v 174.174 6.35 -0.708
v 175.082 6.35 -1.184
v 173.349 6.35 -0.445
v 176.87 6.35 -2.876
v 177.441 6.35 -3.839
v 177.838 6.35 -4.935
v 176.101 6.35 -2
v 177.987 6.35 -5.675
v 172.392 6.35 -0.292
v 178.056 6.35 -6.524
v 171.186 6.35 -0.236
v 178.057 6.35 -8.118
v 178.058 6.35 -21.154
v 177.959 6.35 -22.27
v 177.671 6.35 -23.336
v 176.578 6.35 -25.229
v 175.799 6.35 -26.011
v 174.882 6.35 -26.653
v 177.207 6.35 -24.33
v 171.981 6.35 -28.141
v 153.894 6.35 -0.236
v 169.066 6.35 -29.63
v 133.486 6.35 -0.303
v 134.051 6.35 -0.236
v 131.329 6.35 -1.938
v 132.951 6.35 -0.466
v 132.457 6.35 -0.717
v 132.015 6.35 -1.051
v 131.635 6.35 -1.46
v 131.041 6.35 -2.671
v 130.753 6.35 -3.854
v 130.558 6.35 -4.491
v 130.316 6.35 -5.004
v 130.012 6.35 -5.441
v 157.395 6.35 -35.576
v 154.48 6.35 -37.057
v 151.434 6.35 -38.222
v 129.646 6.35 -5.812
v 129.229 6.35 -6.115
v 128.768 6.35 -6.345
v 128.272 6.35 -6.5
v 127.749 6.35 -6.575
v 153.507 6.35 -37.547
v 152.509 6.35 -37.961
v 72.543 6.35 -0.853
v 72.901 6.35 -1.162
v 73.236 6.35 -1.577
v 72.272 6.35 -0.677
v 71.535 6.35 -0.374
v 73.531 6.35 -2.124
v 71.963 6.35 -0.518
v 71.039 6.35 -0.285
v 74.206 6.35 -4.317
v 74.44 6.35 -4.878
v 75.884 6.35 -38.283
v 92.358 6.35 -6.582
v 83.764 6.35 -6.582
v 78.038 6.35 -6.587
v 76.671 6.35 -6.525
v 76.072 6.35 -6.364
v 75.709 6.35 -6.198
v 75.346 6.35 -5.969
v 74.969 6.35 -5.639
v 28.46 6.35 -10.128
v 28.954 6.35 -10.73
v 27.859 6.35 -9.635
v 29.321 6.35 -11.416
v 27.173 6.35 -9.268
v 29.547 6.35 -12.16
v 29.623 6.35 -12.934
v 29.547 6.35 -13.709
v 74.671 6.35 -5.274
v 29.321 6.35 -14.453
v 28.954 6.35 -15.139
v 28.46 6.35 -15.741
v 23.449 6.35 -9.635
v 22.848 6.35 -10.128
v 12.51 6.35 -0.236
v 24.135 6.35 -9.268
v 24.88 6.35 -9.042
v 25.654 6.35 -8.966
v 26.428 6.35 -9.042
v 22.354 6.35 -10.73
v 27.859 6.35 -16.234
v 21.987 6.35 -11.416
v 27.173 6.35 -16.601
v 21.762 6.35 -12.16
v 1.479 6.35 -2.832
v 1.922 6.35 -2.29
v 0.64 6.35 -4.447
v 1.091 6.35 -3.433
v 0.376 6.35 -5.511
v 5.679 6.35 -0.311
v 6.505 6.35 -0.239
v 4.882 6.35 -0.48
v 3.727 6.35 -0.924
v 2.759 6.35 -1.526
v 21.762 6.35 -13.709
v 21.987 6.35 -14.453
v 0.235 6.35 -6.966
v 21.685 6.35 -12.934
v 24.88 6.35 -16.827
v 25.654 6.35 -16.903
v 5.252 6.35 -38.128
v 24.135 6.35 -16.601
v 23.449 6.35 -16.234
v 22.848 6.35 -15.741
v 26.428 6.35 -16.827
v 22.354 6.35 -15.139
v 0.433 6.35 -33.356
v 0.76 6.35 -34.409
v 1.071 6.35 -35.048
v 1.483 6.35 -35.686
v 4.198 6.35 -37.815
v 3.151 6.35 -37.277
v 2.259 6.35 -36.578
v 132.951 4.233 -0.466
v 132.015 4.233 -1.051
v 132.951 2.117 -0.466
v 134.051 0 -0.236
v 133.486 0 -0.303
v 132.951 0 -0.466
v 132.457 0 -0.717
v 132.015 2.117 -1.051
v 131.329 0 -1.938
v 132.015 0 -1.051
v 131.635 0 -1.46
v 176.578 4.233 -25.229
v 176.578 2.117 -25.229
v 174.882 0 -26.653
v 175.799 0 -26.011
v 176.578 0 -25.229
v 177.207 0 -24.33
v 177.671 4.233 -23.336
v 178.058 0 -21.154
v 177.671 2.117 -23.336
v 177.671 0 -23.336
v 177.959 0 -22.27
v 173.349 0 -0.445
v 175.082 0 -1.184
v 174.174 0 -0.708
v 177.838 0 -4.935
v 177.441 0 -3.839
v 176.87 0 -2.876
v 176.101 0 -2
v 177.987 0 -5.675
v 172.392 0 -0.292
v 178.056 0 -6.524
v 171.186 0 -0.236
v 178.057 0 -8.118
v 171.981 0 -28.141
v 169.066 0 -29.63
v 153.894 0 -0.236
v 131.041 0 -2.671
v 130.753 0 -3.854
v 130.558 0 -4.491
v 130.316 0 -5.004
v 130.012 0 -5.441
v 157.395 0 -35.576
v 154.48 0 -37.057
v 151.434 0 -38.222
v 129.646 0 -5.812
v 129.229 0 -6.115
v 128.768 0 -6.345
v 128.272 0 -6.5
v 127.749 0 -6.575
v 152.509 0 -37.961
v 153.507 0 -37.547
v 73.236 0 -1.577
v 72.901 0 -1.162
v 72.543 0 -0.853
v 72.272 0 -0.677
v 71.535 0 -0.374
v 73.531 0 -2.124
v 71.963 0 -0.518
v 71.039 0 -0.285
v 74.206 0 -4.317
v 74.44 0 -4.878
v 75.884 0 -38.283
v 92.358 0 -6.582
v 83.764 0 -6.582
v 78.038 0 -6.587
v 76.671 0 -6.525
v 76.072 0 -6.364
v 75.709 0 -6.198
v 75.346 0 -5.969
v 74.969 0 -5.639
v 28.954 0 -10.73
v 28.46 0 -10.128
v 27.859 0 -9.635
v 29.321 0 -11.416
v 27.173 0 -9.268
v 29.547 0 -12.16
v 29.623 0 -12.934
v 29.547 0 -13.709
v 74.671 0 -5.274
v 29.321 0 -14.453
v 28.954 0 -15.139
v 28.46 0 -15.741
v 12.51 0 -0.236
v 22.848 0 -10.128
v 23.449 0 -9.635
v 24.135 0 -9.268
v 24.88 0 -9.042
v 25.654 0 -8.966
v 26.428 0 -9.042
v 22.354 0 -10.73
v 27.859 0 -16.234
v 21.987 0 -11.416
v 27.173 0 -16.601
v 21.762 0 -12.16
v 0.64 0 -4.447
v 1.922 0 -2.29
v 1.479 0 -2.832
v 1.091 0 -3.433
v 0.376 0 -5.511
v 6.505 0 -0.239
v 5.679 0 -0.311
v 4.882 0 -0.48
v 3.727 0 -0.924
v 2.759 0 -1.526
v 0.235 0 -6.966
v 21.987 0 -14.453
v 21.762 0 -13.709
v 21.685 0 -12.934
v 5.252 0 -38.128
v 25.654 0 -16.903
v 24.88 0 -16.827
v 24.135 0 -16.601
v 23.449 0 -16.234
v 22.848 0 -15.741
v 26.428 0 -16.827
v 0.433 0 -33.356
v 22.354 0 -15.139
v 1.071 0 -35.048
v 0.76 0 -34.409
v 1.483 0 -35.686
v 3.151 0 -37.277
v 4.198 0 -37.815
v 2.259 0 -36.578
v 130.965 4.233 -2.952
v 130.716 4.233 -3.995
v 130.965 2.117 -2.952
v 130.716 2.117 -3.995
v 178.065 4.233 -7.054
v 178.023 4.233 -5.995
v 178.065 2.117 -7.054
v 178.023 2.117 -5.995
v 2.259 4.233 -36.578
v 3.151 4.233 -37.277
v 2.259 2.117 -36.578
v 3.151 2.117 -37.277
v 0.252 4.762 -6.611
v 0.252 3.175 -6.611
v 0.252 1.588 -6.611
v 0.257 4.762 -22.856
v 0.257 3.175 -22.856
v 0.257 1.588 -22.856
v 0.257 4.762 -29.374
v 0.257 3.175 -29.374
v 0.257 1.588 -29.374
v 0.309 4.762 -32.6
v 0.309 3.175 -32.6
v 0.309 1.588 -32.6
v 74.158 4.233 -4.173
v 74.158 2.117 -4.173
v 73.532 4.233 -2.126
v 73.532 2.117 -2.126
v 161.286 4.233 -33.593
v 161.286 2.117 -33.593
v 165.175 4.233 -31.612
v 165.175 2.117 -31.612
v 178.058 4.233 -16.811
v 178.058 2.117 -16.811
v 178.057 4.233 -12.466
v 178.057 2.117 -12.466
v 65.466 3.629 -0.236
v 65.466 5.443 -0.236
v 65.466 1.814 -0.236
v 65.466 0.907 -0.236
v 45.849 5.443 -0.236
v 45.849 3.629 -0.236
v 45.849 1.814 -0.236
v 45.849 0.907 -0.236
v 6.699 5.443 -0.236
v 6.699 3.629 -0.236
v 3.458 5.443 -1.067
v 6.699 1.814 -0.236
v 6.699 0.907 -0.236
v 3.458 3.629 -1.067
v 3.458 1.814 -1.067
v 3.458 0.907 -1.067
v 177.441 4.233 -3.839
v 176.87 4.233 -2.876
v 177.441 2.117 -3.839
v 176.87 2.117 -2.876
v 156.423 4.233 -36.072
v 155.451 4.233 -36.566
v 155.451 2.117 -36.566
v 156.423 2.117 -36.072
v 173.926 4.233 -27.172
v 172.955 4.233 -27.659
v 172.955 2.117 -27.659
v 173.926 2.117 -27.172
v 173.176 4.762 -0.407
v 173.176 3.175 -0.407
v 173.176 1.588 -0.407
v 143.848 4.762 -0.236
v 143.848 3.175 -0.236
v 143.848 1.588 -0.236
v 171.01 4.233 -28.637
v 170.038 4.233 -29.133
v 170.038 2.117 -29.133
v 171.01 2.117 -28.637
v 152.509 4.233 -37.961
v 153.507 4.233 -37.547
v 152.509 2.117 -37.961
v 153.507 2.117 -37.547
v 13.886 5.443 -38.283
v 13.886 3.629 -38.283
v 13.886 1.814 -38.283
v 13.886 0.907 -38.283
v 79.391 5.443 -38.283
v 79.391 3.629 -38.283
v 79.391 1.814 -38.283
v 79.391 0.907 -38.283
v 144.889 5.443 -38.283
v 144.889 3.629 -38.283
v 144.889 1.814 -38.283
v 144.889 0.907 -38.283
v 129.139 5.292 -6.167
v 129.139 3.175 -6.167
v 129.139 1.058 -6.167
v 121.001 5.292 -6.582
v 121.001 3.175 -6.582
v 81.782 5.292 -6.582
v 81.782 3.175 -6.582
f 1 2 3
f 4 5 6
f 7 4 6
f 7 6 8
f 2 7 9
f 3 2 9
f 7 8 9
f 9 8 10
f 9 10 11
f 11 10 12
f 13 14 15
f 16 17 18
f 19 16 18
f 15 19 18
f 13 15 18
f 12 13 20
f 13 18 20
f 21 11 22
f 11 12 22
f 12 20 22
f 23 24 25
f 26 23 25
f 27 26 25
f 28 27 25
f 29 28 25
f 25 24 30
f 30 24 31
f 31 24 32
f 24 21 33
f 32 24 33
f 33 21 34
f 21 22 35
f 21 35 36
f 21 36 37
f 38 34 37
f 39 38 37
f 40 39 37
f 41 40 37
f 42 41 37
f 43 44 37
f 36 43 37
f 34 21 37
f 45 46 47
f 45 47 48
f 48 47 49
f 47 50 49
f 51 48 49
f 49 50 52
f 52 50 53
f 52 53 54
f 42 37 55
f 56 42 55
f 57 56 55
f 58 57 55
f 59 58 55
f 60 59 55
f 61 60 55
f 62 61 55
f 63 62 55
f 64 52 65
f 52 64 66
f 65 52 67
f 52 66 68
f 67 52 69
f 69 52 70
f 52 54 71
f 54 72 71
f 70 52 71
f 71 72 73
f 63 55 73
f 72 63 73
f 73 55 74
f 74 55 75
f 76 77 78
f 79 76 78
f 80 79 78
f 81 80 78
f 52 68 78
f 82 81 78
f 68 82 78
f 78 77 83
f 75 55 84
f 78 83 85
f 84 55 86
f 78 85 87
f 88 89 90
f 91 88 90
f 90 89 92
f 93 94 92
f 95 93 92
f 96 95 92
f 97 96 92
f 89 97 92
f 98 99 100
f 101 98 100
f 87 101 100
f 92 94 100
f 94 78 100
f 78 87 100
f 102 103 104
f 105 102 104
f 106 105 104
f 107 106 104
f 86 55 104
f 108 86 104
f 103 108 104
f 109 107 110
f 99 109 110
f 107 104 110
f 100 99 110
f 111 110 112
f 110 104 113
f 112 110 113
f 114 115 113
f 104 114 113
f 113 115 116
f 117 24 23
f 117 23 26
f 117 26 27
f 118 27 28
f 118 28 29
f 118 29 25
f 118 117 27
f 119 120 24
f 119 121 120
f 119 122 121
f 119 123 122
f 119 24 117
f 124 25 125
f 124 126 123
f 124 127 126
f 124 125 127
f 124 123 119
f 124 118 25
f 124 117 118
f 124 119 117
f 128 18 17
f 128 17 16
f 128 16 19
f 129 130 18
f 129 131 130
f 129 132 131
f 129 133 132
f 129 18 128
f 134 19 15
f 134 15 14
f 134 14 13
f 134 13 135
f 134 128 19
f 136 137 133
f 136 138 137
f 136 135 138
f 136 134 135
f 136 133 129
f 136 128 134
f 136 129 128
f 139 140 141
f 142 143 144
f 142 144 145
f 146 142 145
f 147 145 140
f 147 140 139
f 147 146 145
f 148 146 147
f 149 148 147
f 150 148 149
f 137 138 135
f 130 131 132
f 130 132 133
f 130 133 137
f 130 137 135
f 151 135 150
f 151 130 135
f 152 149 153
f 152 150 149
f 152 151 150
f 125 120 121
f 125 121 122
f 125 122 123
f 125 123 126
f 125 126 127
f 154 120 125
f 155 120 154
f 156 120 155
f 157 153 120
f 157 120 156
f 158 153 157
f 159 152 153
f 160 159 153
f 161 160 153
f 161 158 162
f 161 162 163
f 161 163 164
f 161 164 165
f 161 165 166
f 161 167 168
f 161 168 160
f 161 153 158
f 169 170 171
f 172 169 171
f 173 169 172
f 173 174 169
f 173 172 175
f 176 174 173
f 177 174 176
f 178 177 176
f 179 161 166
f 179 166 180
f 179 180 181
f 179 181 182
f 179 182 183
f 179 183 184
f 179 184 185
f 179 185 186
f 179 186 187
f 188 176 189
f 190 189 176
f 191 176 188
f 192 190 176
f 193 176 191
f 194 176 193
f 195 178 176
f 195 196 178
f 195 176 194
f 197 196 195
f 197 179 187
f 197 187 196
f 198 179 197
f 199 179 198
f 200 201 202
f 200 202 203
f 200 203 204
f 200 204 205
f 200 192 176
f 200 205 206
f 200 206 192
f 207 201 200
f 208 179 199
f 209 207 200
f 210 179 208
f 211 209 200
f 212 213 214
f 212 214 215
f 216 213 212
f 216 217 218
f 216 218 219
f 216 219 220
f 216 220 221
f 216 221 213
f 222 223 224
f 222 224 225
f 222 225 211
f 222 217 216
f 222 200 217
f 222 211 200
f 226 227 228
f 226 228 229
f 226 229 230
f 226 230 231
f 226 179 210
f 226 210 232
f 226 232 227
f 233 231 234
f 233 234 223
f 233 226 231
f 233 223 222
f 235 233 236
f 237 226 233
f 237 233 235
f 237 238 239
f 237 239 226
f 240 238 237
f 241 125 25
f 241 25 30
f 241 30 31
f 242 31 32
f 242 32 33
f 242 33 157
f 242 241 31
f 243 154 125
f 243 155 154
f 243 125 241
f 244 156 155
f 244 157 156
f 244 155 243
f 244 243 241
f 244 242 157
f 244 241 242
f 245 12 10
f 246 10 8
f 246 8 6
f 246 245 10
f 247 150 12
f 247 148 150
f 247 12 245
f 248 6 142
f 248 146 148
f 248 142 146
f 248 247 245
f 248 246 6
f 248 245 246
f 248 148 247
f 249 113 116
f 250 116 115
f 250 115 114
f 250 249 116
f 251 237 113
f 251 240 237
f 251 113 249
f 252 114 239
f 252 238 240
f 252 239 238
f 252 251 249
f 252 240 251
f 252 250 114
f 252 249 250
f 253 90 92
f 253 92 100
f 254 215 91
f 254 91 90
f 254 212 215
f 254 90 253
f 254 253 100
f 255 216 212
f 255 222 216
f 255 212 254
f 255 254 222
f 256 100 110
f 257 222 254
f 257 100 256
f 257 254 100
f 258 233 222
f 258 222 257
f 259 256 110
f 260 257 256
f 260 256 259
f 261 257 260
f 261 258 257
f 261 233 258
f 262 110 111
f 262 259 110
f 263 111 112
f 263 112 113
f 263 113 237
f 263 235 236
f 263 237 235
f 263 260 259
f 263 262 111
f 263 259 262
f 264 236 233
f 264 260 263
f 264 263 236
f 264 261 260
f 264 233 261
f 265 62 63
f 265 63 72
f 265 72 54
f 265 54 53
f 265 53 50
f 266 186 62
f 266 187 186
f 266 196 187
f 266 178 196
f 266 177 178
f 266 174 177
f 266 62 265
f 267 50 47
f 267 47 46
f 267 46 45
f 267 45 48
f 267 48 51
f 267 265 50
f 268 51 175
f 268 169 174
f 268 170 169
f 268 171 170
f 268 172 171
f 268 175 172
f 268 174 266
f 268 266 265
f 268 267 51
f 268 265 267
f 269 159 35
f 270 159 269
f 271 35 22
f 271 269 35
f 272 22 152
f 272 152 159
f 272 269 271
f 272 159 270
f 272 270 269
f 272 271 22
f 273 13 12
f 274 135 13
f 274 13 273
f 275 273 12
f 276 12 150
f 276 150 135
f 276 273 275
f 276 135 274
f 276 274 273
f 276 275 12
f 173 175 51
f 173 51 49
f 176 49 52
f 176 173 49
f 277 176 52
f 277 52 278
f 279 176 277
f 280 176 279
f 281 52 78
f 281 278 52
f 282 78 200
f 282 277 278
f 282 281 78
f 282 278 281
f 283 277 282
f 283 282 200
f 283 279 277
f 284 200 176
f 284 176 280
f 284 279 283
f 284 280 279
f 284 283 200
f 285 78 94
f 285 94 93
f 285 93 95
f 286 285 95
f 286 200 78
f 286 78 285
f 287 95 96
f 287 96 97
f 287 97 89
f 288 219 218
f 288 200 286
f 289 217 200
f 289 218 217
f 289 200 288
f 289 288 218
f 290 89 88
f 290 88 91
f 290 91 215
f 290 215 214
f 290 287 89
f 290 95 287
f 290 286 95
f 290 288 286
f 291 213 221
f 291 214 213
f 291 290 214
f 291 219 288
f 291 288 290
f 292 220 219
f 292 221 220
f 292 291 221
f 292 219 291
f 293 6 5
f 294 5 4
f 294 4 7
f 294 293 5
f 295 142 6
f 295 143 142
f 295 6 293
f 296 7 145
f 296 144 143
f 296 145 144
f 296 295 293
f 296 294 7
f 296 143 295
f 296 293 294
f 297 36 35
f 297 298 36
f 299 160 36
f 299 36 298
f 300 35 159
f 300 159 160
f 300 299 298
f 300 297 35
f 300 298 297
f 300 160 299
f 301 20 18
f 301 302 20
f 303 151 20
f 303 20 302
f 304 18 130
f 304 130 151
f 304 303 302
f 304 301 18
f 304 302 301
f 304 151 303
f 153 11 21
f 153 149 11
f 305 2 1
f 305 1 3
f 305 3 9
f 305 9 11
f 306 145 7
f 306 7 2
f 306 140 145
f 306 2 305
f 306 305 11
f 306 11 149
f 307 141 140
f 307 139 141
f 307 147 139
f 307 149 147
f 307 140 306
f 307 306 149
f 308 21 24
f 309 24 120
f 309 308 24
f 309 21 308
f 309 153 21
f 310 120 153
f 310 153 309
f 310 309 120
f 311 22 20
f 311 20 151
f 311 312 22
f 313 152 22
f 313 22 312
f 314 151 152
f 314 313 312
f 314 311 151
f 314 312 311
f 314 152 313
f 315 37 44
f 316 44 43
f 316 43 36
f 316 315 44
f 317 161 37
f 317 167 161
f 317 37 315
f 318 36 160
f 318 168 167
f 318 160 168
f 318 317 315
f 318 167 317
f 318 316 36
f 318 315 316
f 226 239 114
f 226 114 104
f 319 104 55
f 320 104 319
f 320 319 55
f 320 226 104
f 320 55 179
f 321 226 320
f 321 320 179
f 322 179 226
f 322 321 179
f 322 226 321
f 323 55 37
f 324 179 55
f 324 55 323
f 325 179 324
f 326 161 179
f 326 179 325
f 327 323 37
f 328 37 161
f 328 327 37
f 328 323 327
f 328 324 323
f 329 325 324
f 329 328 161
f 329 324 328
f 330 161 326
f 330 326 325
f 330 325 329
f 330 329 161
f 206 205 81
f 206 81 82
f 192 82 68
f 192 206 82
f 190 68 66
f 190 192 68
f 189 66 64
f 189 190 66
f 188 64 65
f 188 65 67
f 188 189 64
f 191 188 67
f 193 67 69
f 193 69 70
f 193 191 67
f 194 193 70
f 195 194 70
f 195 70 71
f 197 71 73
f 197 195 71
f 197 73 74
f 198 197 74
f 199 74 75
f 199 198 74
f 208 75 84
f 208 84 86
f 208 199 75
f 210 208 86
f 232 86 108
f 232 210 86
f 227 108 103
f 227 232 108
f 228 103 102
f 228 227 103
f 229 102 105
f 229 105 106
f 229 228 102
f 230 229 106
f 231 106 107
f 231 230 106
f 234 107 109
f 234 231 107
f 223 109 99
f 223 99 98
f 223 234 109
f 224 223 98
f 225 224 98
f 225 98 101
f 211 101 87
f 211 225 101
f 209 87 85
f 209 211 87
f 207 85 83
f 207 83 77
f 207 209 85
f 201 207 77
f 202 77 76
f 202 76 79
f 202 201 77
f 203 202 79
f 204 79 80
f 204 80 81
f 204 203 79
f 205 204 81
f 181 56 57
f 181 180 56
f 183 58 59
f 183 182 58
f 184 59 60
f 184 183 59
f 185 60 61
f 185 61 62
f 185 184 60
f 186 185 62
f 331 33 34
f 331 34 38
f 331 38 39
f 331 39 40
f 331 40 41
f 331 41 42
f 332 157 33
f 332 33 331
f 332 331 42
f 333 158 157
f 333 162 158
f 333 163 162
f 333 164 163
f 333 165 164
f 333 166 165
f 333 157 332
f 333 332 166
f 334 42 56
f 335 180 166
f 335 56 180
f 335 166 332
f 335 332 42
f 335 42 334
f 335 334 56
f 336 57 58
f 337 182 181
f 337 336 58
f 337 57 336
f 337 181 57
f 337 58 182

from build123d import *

# Parameters (mm, degrees)
SKETCH4_R           = 3.96875
BOSS_EXTRUDE1_DEPTH = 6.35


with BuildPart() as part:
    # Sketch4 → Boss-Extrude1 (new body)
    with BuildSketch(Plane(origin=(0, 0, 0), x_dir=(1, 0, 0), z_dir=(0, 1, 0))):
        with BuildLine():
            add(Edge.make_bspline(
                [(157.3945036, 35.575748), (161.28746, 33.591373), (165.173533, 31.6138814), (169.0664894, 29.6295064)],
                knots=[0, 0, 0, 0, 1, 1, 1, 1], degree=3))
            add(Edge.make_bspline(
                [(169.0664894, 29.6295064), (170.038014, 29.1333936), (171.0095386, 28.6373062), (171.9810378, 28.1412188)],
                knots=[0, 0, 0, 0, 1, 1, 1, 1], degree=3))
            add(Edge.make_bspline(
                [(171.9810378, 28.1412188), (172.9525624, 27.6520148), (173.9378538, 27.1972786), (174.8818194, 26.6529312)],
                knots=[0, 0, 0, 0, 1, 1, 1, 1], degree=3))
            add(Edge.make_bspline(
                [(174.8818194, 26.6529312), (176.845674168, 25.522871997), (178.058382888, 23.42110905), (178.058190977, 21.154029732)],
                knots=[0, 0, 0, 0, 1.00007912, 1.00007912, 1.00007912, 1.00007912], degree=3))
            add(Edge.make_bspline(
                [(178.058190977, 21.154029732), (178.057823515, 16.813399333), (178.05745549, 12.46586099), (178.057087466, 8.118322647)],
                knots=[4.1319e-05, 4.1319e-05, 4.1319e-05, 4.1319e-05, 1, 1, 1, 1], degree=3))
            add(Edge.make_bspline(
                [(178.057087466, 8.118322647), (178.057457698, 7.050328911), (178.126784145, 5.99615128), (177.8376936, 4.934966)],
                knots=[0, 0, 0, 0, 1, 1, 1, 1], degree=3))
            add(Edge.make_bspline(
                [(177.8376936, 4.934966), (177.5207524, 3.7567616), (176.9764304, 2.8472638), (176.101375, 1.9997674)],
                knots=[0, 0, 0, 0, 1, 1, 1, 1], degree=3))
            add(Edge.make_bspline(
                [(176.101375, 1.9997674), (174.117, 0.1049528), (172.3462136, 0.2358644), (169.9208692, 0.2358644)],
                knots=[0, 0, 0, 0, 1, 1, 1, 1], degree=3))
            add(Edge.make_bspline(
                [(169.9208692, 0.2358644), (161.232342, 0.2358644), (152.5369314, 0.2358644), (143.8483788, 0.2358644)],
                knots=[0, 0, 0, 0, 1, 1, 1, 1], degree=3))
            add(Edge.make_bspline(
                [(143.8483788, 0.2358644), (141.664182, 0.2358644), (139.486894, 0.2358644), (137.309606, 0.2358644)],
                knots=[0, 0, 0, 0, 1, 1, 1, 1], degree=3))
            add(Edge.make_bspline(
                [(137.309606, 0.2358644), (136.2209366, 0.2358644), (135.139176, 0.2013712), (134.050532, 0.2358644)],
                knots=[0, 0, 0, 0, 1, 1, 1, 1], degree=3))
            add(Edge.make_bspline(
                [(134.050532, 0.2358644), (132.8998866, 0.2703576), (131.8594518, 0.9180068), (131.3288966, 1.9377406)],
                knots=[0, 0, 0, 0, 1, 1, 1, 1], degree=3))
            add(Edge.make_bspline(
                [(131.3288966, 1.9377406), (130.8190424, 2.9161486), (130.8810692, 4.0323516), (130.3160462, 5.0038762)],
                knots=[0, 0, 0, 0, 1, 1, 1, 1], degree=3))
            add(Edge.make_bspline(
                [(130.3160462, 5.0038762), (129.7372818, 6.0029598), (128.6830802, 6.5817496), (127.5324094, 6.5817496)],
                knots=[0, 0, 0, 0, 1, 1, 1, 1], degree=3))
            add(Edge.make_bspline(
                [(127.5324094, 6.5817496), (125.3551214, 6.5817496), (123.177808, 6.5817496), (121.00052, 6.5817496)],
                knots=[0, 0, 0, 0, 1, 1, 1, 1], degree=3))
            add(Edge.make_bspline(
                [(121.00052, 6.5817496), (112.2844084, 6.5817496), (103.575231, 6.5817496), (94.8591194, 6.5817496)],
                knots=[0, 0, 0, 0, 1, 1, 1, 1], degree=3))
            add(Edge.make_bspline(
                [(94.8591194, 6.5817496), (90.504518, 6.5817496), (86.1430332, 6.5817496), (81.7815484, 6.5817496)],
                knots=[0, 0, 0, 0, 1, 1, 1, 1], degree=3))
            add(Edge.make_bspline(
                [(81.7815484, 6.5817496), (80.6929044, 6.5817496), (79.604235, 6.5817496), (78.515591, 6.5817496)],
                knots=[0, 0, 0, 0, 1, 1, 1, 1], degree=3))
            add(Edge.make_bspline(
                [(78.515591, 6.5817496), (77.399388, 6.5817496), (76.3727454, 6.7194938), (75.3461028, 5.9685174)],
                knots=[0, 0, 0, 0, 1, 1, 1, 1], degree=3))
            add(Edge.make_bspline(
                [(75.3461028, 5.9685174), (73.37552, 4.5284644), (74.5055152, 1.6759174), (71.963026, 0.5183632)],
                knots=[0, 0, 0, 0, 1, 1, 1, 1], degree=3))
            add(Edge.make_bspline(
                [(71.963026, 0.5183632), (71.122413, 0.1325118), (69.572124, 0.2358644), (68.7315364, 0.2358644)],
                knots=[0, 0, 0, 0, 1, 1, 1, 1], degree=3))
            add(Edge.make_bspline(
                [(68.7315364, 0.2358644), (67.642867, 0.2358644), (66.554223, 0.2358644), (65.465579, 0.2358644)],
                knots=[0, 0, 0, 0, 1, 1, 1, 1], degree=3))
            add(Edge.make_bspline(
                [(65.465579, 0.2358644), (63.2882656, 0.2358644), (61.1040942, 0.2358644), (58.9267808, 0.2358644)],
                knots=[0, 0, 0, 0, 1, 1, 1, 1], degree=3))
            add(Edge.make_bspline(
                [(58.9267808, 0.2358644), (54.565296, 0.2358644), (50.2106946, 0.2358644), (45.8492098, 0.2358644)],
                knots=[0, 0, 0, 0, 1, 1, 1, 1], degree=3))
            add(Edge.make_bspline(
                [(45.8492098, 0.2358644), (37.1537738, 0.2358644), (28.4514798, 0.2358644), (19.7491604, 0.2358644)],
                knots=[0, 0, 0, 0, 1, 1, 1, 1], degree=3))
            add(Edge.make_bspline(
                [(19.7491604, 0.2358644), (15.4014424, 0.2358644), (11.046841, 0.2358644), (6.699123, 0.2358644)],
                knots=[0, 0, 0, 0, 1, 1, 1, 1], degree=3))
            add(Edge.make_bspline(
                [(6.699123, 0.2358644), (4.3633644, 0.2358644), (2.2618446, 1.3865352), (1.0905236, 3.4329116)],
                knots=[0, 0, 0, 0, 1, 1, 1, 1], degree=3))
            add(Edge.make_bspline(
                [(1.0905236, 3.4329116), (-0.0325882, 5.4035198), (0.256794, 7.8081886), (0.256794, 9.8201226)],
                knots=[0, 0, 0, 0, 1, 1, 1, 1], degree=3))
            add(Edge.make_bspline(
                [(0.256794, 9.8201226), (0.256794, 14.1678406), (0.256794, 18.5155586), (0.256794, 22.8563678)],
                knots=[0, 0, 0, 0, 1, 1, 1, 1], degree=3))
            add(Edge.make_bspline(
                [(0.256794, 22.8563678), (0.256794, 25.0336558), (0.256794, 27.2040858), (0.256794, 29.3744904)],
                knots=[0, 0, 0, 0, 1, 1, 1, 1], degree=3))
            add(Edge.make_bspline(
                [(0.256794, 29.3744904), (0.256794, 31.600013), (-0.0118872, 33.6464148), (1.4832584, 35.6859078)],
                knots=[0, 0, 0, 0, 1, 1, 1, 1], degree=3))
            add(Edge.make_bspline(
                [(1.4832584, 35.6859078), (2.21361, 36.6849914), (3.0611064, 37.3464328), (4.197985, 37.8149866)],
                knots=[0, 0, 0, 0, 1, 1, 1, 1], degree=3))
            add(Edge.make_bspline(
                [(4.197985, 37.8149866), (5.2453032, 38.2421892), (6.2788292, 38.2834896), (7.3674732, 38.2834896)],
                knots=[0, 0, 0, 0, 1, 1, 1, 1], degree=3))
            add(Edge.make_bspline(
                [(7.3674732, 38.2834896), (9.5379032, 38.2834896), (11.7083078, 38.2834896), (13.8855958, 38.2834896)],
                knots=[0, 0, 0, 0, 1, 1, 1, 1], degree=3))
            add(Edge.make_bspline(
                [(13.8855958, 38.2834896), (18.2264304, 38.2834896), (22.574123, 38.2834896), (26.921841, 38.2834896)],
                knots=[0, 0, 0, 0, 1, 1, 1, 1], degree=3))
            add(Edge.make_bspline(
                [(26.921841, 38.2834896), (44.4091568, 38.2834896), (61.8964472, 38.2834896), (79.3906464, 38.2834896)],
                knots=[0, 0, 0, 0, 1, 1, 1, 1], degree=3))
            add(Edge.make_bspline(
                [(79.3906464, 38.2834896), (96.8572866, 38.2834896), (114.3308102, 38.2834896), (131.7974504, 38.2834896)],
                knots=[0, 0, 0, 0, 1, 1, 1, 1], degree=3))
            add(Edge.make_bspline(
                [(131.7974504, 38.2834896), (136.1589352, 38.2834896), (140.5273034, 38.2834896), (144.8888136, 38.2834896)],
                knots=[0, 0, 0, 0, 1, 1, 1, 1], degree=3))
            add(Edge.make_bspline(
                [(144.8888136, 38.2834896), (145.4744614, 38.2834896), (150.8419386, 38.3039874), (151.4344952, 38.2215898)],
                knots=[0, 0, 0, 0, 1, 1, 1, 1], degree=3))
            add(Edge.make_bspline(
                [(151.4344952, 38.2215898), (152.5644904, 38.0630176), (153.5015472, 37.560123), (154.4799552, 37.0571268)],
                knots=[0, 0, 0, 0, 1, 1, 1, 1], degree=3))
            add(Edge.make_bspline(
                [(154.4799552, 37.0571268), (155.4514798, 36.5679228), (156.422979, 36.0718354), (157.3945036, 35.575748)],
                knots=[0, 0, 0, 0, 1, 1, 1, 1], degree=3))
        make_face()
        with Locations(Location((25.6540508, 12.9344928, 0), (0, 0, 270))):
            Circle(SKETCH4_R, mode=Mode.SUBTRACT)
    extrude(amount=BOSS_EXTRUDE1_DEPTH)


solid = part.part
